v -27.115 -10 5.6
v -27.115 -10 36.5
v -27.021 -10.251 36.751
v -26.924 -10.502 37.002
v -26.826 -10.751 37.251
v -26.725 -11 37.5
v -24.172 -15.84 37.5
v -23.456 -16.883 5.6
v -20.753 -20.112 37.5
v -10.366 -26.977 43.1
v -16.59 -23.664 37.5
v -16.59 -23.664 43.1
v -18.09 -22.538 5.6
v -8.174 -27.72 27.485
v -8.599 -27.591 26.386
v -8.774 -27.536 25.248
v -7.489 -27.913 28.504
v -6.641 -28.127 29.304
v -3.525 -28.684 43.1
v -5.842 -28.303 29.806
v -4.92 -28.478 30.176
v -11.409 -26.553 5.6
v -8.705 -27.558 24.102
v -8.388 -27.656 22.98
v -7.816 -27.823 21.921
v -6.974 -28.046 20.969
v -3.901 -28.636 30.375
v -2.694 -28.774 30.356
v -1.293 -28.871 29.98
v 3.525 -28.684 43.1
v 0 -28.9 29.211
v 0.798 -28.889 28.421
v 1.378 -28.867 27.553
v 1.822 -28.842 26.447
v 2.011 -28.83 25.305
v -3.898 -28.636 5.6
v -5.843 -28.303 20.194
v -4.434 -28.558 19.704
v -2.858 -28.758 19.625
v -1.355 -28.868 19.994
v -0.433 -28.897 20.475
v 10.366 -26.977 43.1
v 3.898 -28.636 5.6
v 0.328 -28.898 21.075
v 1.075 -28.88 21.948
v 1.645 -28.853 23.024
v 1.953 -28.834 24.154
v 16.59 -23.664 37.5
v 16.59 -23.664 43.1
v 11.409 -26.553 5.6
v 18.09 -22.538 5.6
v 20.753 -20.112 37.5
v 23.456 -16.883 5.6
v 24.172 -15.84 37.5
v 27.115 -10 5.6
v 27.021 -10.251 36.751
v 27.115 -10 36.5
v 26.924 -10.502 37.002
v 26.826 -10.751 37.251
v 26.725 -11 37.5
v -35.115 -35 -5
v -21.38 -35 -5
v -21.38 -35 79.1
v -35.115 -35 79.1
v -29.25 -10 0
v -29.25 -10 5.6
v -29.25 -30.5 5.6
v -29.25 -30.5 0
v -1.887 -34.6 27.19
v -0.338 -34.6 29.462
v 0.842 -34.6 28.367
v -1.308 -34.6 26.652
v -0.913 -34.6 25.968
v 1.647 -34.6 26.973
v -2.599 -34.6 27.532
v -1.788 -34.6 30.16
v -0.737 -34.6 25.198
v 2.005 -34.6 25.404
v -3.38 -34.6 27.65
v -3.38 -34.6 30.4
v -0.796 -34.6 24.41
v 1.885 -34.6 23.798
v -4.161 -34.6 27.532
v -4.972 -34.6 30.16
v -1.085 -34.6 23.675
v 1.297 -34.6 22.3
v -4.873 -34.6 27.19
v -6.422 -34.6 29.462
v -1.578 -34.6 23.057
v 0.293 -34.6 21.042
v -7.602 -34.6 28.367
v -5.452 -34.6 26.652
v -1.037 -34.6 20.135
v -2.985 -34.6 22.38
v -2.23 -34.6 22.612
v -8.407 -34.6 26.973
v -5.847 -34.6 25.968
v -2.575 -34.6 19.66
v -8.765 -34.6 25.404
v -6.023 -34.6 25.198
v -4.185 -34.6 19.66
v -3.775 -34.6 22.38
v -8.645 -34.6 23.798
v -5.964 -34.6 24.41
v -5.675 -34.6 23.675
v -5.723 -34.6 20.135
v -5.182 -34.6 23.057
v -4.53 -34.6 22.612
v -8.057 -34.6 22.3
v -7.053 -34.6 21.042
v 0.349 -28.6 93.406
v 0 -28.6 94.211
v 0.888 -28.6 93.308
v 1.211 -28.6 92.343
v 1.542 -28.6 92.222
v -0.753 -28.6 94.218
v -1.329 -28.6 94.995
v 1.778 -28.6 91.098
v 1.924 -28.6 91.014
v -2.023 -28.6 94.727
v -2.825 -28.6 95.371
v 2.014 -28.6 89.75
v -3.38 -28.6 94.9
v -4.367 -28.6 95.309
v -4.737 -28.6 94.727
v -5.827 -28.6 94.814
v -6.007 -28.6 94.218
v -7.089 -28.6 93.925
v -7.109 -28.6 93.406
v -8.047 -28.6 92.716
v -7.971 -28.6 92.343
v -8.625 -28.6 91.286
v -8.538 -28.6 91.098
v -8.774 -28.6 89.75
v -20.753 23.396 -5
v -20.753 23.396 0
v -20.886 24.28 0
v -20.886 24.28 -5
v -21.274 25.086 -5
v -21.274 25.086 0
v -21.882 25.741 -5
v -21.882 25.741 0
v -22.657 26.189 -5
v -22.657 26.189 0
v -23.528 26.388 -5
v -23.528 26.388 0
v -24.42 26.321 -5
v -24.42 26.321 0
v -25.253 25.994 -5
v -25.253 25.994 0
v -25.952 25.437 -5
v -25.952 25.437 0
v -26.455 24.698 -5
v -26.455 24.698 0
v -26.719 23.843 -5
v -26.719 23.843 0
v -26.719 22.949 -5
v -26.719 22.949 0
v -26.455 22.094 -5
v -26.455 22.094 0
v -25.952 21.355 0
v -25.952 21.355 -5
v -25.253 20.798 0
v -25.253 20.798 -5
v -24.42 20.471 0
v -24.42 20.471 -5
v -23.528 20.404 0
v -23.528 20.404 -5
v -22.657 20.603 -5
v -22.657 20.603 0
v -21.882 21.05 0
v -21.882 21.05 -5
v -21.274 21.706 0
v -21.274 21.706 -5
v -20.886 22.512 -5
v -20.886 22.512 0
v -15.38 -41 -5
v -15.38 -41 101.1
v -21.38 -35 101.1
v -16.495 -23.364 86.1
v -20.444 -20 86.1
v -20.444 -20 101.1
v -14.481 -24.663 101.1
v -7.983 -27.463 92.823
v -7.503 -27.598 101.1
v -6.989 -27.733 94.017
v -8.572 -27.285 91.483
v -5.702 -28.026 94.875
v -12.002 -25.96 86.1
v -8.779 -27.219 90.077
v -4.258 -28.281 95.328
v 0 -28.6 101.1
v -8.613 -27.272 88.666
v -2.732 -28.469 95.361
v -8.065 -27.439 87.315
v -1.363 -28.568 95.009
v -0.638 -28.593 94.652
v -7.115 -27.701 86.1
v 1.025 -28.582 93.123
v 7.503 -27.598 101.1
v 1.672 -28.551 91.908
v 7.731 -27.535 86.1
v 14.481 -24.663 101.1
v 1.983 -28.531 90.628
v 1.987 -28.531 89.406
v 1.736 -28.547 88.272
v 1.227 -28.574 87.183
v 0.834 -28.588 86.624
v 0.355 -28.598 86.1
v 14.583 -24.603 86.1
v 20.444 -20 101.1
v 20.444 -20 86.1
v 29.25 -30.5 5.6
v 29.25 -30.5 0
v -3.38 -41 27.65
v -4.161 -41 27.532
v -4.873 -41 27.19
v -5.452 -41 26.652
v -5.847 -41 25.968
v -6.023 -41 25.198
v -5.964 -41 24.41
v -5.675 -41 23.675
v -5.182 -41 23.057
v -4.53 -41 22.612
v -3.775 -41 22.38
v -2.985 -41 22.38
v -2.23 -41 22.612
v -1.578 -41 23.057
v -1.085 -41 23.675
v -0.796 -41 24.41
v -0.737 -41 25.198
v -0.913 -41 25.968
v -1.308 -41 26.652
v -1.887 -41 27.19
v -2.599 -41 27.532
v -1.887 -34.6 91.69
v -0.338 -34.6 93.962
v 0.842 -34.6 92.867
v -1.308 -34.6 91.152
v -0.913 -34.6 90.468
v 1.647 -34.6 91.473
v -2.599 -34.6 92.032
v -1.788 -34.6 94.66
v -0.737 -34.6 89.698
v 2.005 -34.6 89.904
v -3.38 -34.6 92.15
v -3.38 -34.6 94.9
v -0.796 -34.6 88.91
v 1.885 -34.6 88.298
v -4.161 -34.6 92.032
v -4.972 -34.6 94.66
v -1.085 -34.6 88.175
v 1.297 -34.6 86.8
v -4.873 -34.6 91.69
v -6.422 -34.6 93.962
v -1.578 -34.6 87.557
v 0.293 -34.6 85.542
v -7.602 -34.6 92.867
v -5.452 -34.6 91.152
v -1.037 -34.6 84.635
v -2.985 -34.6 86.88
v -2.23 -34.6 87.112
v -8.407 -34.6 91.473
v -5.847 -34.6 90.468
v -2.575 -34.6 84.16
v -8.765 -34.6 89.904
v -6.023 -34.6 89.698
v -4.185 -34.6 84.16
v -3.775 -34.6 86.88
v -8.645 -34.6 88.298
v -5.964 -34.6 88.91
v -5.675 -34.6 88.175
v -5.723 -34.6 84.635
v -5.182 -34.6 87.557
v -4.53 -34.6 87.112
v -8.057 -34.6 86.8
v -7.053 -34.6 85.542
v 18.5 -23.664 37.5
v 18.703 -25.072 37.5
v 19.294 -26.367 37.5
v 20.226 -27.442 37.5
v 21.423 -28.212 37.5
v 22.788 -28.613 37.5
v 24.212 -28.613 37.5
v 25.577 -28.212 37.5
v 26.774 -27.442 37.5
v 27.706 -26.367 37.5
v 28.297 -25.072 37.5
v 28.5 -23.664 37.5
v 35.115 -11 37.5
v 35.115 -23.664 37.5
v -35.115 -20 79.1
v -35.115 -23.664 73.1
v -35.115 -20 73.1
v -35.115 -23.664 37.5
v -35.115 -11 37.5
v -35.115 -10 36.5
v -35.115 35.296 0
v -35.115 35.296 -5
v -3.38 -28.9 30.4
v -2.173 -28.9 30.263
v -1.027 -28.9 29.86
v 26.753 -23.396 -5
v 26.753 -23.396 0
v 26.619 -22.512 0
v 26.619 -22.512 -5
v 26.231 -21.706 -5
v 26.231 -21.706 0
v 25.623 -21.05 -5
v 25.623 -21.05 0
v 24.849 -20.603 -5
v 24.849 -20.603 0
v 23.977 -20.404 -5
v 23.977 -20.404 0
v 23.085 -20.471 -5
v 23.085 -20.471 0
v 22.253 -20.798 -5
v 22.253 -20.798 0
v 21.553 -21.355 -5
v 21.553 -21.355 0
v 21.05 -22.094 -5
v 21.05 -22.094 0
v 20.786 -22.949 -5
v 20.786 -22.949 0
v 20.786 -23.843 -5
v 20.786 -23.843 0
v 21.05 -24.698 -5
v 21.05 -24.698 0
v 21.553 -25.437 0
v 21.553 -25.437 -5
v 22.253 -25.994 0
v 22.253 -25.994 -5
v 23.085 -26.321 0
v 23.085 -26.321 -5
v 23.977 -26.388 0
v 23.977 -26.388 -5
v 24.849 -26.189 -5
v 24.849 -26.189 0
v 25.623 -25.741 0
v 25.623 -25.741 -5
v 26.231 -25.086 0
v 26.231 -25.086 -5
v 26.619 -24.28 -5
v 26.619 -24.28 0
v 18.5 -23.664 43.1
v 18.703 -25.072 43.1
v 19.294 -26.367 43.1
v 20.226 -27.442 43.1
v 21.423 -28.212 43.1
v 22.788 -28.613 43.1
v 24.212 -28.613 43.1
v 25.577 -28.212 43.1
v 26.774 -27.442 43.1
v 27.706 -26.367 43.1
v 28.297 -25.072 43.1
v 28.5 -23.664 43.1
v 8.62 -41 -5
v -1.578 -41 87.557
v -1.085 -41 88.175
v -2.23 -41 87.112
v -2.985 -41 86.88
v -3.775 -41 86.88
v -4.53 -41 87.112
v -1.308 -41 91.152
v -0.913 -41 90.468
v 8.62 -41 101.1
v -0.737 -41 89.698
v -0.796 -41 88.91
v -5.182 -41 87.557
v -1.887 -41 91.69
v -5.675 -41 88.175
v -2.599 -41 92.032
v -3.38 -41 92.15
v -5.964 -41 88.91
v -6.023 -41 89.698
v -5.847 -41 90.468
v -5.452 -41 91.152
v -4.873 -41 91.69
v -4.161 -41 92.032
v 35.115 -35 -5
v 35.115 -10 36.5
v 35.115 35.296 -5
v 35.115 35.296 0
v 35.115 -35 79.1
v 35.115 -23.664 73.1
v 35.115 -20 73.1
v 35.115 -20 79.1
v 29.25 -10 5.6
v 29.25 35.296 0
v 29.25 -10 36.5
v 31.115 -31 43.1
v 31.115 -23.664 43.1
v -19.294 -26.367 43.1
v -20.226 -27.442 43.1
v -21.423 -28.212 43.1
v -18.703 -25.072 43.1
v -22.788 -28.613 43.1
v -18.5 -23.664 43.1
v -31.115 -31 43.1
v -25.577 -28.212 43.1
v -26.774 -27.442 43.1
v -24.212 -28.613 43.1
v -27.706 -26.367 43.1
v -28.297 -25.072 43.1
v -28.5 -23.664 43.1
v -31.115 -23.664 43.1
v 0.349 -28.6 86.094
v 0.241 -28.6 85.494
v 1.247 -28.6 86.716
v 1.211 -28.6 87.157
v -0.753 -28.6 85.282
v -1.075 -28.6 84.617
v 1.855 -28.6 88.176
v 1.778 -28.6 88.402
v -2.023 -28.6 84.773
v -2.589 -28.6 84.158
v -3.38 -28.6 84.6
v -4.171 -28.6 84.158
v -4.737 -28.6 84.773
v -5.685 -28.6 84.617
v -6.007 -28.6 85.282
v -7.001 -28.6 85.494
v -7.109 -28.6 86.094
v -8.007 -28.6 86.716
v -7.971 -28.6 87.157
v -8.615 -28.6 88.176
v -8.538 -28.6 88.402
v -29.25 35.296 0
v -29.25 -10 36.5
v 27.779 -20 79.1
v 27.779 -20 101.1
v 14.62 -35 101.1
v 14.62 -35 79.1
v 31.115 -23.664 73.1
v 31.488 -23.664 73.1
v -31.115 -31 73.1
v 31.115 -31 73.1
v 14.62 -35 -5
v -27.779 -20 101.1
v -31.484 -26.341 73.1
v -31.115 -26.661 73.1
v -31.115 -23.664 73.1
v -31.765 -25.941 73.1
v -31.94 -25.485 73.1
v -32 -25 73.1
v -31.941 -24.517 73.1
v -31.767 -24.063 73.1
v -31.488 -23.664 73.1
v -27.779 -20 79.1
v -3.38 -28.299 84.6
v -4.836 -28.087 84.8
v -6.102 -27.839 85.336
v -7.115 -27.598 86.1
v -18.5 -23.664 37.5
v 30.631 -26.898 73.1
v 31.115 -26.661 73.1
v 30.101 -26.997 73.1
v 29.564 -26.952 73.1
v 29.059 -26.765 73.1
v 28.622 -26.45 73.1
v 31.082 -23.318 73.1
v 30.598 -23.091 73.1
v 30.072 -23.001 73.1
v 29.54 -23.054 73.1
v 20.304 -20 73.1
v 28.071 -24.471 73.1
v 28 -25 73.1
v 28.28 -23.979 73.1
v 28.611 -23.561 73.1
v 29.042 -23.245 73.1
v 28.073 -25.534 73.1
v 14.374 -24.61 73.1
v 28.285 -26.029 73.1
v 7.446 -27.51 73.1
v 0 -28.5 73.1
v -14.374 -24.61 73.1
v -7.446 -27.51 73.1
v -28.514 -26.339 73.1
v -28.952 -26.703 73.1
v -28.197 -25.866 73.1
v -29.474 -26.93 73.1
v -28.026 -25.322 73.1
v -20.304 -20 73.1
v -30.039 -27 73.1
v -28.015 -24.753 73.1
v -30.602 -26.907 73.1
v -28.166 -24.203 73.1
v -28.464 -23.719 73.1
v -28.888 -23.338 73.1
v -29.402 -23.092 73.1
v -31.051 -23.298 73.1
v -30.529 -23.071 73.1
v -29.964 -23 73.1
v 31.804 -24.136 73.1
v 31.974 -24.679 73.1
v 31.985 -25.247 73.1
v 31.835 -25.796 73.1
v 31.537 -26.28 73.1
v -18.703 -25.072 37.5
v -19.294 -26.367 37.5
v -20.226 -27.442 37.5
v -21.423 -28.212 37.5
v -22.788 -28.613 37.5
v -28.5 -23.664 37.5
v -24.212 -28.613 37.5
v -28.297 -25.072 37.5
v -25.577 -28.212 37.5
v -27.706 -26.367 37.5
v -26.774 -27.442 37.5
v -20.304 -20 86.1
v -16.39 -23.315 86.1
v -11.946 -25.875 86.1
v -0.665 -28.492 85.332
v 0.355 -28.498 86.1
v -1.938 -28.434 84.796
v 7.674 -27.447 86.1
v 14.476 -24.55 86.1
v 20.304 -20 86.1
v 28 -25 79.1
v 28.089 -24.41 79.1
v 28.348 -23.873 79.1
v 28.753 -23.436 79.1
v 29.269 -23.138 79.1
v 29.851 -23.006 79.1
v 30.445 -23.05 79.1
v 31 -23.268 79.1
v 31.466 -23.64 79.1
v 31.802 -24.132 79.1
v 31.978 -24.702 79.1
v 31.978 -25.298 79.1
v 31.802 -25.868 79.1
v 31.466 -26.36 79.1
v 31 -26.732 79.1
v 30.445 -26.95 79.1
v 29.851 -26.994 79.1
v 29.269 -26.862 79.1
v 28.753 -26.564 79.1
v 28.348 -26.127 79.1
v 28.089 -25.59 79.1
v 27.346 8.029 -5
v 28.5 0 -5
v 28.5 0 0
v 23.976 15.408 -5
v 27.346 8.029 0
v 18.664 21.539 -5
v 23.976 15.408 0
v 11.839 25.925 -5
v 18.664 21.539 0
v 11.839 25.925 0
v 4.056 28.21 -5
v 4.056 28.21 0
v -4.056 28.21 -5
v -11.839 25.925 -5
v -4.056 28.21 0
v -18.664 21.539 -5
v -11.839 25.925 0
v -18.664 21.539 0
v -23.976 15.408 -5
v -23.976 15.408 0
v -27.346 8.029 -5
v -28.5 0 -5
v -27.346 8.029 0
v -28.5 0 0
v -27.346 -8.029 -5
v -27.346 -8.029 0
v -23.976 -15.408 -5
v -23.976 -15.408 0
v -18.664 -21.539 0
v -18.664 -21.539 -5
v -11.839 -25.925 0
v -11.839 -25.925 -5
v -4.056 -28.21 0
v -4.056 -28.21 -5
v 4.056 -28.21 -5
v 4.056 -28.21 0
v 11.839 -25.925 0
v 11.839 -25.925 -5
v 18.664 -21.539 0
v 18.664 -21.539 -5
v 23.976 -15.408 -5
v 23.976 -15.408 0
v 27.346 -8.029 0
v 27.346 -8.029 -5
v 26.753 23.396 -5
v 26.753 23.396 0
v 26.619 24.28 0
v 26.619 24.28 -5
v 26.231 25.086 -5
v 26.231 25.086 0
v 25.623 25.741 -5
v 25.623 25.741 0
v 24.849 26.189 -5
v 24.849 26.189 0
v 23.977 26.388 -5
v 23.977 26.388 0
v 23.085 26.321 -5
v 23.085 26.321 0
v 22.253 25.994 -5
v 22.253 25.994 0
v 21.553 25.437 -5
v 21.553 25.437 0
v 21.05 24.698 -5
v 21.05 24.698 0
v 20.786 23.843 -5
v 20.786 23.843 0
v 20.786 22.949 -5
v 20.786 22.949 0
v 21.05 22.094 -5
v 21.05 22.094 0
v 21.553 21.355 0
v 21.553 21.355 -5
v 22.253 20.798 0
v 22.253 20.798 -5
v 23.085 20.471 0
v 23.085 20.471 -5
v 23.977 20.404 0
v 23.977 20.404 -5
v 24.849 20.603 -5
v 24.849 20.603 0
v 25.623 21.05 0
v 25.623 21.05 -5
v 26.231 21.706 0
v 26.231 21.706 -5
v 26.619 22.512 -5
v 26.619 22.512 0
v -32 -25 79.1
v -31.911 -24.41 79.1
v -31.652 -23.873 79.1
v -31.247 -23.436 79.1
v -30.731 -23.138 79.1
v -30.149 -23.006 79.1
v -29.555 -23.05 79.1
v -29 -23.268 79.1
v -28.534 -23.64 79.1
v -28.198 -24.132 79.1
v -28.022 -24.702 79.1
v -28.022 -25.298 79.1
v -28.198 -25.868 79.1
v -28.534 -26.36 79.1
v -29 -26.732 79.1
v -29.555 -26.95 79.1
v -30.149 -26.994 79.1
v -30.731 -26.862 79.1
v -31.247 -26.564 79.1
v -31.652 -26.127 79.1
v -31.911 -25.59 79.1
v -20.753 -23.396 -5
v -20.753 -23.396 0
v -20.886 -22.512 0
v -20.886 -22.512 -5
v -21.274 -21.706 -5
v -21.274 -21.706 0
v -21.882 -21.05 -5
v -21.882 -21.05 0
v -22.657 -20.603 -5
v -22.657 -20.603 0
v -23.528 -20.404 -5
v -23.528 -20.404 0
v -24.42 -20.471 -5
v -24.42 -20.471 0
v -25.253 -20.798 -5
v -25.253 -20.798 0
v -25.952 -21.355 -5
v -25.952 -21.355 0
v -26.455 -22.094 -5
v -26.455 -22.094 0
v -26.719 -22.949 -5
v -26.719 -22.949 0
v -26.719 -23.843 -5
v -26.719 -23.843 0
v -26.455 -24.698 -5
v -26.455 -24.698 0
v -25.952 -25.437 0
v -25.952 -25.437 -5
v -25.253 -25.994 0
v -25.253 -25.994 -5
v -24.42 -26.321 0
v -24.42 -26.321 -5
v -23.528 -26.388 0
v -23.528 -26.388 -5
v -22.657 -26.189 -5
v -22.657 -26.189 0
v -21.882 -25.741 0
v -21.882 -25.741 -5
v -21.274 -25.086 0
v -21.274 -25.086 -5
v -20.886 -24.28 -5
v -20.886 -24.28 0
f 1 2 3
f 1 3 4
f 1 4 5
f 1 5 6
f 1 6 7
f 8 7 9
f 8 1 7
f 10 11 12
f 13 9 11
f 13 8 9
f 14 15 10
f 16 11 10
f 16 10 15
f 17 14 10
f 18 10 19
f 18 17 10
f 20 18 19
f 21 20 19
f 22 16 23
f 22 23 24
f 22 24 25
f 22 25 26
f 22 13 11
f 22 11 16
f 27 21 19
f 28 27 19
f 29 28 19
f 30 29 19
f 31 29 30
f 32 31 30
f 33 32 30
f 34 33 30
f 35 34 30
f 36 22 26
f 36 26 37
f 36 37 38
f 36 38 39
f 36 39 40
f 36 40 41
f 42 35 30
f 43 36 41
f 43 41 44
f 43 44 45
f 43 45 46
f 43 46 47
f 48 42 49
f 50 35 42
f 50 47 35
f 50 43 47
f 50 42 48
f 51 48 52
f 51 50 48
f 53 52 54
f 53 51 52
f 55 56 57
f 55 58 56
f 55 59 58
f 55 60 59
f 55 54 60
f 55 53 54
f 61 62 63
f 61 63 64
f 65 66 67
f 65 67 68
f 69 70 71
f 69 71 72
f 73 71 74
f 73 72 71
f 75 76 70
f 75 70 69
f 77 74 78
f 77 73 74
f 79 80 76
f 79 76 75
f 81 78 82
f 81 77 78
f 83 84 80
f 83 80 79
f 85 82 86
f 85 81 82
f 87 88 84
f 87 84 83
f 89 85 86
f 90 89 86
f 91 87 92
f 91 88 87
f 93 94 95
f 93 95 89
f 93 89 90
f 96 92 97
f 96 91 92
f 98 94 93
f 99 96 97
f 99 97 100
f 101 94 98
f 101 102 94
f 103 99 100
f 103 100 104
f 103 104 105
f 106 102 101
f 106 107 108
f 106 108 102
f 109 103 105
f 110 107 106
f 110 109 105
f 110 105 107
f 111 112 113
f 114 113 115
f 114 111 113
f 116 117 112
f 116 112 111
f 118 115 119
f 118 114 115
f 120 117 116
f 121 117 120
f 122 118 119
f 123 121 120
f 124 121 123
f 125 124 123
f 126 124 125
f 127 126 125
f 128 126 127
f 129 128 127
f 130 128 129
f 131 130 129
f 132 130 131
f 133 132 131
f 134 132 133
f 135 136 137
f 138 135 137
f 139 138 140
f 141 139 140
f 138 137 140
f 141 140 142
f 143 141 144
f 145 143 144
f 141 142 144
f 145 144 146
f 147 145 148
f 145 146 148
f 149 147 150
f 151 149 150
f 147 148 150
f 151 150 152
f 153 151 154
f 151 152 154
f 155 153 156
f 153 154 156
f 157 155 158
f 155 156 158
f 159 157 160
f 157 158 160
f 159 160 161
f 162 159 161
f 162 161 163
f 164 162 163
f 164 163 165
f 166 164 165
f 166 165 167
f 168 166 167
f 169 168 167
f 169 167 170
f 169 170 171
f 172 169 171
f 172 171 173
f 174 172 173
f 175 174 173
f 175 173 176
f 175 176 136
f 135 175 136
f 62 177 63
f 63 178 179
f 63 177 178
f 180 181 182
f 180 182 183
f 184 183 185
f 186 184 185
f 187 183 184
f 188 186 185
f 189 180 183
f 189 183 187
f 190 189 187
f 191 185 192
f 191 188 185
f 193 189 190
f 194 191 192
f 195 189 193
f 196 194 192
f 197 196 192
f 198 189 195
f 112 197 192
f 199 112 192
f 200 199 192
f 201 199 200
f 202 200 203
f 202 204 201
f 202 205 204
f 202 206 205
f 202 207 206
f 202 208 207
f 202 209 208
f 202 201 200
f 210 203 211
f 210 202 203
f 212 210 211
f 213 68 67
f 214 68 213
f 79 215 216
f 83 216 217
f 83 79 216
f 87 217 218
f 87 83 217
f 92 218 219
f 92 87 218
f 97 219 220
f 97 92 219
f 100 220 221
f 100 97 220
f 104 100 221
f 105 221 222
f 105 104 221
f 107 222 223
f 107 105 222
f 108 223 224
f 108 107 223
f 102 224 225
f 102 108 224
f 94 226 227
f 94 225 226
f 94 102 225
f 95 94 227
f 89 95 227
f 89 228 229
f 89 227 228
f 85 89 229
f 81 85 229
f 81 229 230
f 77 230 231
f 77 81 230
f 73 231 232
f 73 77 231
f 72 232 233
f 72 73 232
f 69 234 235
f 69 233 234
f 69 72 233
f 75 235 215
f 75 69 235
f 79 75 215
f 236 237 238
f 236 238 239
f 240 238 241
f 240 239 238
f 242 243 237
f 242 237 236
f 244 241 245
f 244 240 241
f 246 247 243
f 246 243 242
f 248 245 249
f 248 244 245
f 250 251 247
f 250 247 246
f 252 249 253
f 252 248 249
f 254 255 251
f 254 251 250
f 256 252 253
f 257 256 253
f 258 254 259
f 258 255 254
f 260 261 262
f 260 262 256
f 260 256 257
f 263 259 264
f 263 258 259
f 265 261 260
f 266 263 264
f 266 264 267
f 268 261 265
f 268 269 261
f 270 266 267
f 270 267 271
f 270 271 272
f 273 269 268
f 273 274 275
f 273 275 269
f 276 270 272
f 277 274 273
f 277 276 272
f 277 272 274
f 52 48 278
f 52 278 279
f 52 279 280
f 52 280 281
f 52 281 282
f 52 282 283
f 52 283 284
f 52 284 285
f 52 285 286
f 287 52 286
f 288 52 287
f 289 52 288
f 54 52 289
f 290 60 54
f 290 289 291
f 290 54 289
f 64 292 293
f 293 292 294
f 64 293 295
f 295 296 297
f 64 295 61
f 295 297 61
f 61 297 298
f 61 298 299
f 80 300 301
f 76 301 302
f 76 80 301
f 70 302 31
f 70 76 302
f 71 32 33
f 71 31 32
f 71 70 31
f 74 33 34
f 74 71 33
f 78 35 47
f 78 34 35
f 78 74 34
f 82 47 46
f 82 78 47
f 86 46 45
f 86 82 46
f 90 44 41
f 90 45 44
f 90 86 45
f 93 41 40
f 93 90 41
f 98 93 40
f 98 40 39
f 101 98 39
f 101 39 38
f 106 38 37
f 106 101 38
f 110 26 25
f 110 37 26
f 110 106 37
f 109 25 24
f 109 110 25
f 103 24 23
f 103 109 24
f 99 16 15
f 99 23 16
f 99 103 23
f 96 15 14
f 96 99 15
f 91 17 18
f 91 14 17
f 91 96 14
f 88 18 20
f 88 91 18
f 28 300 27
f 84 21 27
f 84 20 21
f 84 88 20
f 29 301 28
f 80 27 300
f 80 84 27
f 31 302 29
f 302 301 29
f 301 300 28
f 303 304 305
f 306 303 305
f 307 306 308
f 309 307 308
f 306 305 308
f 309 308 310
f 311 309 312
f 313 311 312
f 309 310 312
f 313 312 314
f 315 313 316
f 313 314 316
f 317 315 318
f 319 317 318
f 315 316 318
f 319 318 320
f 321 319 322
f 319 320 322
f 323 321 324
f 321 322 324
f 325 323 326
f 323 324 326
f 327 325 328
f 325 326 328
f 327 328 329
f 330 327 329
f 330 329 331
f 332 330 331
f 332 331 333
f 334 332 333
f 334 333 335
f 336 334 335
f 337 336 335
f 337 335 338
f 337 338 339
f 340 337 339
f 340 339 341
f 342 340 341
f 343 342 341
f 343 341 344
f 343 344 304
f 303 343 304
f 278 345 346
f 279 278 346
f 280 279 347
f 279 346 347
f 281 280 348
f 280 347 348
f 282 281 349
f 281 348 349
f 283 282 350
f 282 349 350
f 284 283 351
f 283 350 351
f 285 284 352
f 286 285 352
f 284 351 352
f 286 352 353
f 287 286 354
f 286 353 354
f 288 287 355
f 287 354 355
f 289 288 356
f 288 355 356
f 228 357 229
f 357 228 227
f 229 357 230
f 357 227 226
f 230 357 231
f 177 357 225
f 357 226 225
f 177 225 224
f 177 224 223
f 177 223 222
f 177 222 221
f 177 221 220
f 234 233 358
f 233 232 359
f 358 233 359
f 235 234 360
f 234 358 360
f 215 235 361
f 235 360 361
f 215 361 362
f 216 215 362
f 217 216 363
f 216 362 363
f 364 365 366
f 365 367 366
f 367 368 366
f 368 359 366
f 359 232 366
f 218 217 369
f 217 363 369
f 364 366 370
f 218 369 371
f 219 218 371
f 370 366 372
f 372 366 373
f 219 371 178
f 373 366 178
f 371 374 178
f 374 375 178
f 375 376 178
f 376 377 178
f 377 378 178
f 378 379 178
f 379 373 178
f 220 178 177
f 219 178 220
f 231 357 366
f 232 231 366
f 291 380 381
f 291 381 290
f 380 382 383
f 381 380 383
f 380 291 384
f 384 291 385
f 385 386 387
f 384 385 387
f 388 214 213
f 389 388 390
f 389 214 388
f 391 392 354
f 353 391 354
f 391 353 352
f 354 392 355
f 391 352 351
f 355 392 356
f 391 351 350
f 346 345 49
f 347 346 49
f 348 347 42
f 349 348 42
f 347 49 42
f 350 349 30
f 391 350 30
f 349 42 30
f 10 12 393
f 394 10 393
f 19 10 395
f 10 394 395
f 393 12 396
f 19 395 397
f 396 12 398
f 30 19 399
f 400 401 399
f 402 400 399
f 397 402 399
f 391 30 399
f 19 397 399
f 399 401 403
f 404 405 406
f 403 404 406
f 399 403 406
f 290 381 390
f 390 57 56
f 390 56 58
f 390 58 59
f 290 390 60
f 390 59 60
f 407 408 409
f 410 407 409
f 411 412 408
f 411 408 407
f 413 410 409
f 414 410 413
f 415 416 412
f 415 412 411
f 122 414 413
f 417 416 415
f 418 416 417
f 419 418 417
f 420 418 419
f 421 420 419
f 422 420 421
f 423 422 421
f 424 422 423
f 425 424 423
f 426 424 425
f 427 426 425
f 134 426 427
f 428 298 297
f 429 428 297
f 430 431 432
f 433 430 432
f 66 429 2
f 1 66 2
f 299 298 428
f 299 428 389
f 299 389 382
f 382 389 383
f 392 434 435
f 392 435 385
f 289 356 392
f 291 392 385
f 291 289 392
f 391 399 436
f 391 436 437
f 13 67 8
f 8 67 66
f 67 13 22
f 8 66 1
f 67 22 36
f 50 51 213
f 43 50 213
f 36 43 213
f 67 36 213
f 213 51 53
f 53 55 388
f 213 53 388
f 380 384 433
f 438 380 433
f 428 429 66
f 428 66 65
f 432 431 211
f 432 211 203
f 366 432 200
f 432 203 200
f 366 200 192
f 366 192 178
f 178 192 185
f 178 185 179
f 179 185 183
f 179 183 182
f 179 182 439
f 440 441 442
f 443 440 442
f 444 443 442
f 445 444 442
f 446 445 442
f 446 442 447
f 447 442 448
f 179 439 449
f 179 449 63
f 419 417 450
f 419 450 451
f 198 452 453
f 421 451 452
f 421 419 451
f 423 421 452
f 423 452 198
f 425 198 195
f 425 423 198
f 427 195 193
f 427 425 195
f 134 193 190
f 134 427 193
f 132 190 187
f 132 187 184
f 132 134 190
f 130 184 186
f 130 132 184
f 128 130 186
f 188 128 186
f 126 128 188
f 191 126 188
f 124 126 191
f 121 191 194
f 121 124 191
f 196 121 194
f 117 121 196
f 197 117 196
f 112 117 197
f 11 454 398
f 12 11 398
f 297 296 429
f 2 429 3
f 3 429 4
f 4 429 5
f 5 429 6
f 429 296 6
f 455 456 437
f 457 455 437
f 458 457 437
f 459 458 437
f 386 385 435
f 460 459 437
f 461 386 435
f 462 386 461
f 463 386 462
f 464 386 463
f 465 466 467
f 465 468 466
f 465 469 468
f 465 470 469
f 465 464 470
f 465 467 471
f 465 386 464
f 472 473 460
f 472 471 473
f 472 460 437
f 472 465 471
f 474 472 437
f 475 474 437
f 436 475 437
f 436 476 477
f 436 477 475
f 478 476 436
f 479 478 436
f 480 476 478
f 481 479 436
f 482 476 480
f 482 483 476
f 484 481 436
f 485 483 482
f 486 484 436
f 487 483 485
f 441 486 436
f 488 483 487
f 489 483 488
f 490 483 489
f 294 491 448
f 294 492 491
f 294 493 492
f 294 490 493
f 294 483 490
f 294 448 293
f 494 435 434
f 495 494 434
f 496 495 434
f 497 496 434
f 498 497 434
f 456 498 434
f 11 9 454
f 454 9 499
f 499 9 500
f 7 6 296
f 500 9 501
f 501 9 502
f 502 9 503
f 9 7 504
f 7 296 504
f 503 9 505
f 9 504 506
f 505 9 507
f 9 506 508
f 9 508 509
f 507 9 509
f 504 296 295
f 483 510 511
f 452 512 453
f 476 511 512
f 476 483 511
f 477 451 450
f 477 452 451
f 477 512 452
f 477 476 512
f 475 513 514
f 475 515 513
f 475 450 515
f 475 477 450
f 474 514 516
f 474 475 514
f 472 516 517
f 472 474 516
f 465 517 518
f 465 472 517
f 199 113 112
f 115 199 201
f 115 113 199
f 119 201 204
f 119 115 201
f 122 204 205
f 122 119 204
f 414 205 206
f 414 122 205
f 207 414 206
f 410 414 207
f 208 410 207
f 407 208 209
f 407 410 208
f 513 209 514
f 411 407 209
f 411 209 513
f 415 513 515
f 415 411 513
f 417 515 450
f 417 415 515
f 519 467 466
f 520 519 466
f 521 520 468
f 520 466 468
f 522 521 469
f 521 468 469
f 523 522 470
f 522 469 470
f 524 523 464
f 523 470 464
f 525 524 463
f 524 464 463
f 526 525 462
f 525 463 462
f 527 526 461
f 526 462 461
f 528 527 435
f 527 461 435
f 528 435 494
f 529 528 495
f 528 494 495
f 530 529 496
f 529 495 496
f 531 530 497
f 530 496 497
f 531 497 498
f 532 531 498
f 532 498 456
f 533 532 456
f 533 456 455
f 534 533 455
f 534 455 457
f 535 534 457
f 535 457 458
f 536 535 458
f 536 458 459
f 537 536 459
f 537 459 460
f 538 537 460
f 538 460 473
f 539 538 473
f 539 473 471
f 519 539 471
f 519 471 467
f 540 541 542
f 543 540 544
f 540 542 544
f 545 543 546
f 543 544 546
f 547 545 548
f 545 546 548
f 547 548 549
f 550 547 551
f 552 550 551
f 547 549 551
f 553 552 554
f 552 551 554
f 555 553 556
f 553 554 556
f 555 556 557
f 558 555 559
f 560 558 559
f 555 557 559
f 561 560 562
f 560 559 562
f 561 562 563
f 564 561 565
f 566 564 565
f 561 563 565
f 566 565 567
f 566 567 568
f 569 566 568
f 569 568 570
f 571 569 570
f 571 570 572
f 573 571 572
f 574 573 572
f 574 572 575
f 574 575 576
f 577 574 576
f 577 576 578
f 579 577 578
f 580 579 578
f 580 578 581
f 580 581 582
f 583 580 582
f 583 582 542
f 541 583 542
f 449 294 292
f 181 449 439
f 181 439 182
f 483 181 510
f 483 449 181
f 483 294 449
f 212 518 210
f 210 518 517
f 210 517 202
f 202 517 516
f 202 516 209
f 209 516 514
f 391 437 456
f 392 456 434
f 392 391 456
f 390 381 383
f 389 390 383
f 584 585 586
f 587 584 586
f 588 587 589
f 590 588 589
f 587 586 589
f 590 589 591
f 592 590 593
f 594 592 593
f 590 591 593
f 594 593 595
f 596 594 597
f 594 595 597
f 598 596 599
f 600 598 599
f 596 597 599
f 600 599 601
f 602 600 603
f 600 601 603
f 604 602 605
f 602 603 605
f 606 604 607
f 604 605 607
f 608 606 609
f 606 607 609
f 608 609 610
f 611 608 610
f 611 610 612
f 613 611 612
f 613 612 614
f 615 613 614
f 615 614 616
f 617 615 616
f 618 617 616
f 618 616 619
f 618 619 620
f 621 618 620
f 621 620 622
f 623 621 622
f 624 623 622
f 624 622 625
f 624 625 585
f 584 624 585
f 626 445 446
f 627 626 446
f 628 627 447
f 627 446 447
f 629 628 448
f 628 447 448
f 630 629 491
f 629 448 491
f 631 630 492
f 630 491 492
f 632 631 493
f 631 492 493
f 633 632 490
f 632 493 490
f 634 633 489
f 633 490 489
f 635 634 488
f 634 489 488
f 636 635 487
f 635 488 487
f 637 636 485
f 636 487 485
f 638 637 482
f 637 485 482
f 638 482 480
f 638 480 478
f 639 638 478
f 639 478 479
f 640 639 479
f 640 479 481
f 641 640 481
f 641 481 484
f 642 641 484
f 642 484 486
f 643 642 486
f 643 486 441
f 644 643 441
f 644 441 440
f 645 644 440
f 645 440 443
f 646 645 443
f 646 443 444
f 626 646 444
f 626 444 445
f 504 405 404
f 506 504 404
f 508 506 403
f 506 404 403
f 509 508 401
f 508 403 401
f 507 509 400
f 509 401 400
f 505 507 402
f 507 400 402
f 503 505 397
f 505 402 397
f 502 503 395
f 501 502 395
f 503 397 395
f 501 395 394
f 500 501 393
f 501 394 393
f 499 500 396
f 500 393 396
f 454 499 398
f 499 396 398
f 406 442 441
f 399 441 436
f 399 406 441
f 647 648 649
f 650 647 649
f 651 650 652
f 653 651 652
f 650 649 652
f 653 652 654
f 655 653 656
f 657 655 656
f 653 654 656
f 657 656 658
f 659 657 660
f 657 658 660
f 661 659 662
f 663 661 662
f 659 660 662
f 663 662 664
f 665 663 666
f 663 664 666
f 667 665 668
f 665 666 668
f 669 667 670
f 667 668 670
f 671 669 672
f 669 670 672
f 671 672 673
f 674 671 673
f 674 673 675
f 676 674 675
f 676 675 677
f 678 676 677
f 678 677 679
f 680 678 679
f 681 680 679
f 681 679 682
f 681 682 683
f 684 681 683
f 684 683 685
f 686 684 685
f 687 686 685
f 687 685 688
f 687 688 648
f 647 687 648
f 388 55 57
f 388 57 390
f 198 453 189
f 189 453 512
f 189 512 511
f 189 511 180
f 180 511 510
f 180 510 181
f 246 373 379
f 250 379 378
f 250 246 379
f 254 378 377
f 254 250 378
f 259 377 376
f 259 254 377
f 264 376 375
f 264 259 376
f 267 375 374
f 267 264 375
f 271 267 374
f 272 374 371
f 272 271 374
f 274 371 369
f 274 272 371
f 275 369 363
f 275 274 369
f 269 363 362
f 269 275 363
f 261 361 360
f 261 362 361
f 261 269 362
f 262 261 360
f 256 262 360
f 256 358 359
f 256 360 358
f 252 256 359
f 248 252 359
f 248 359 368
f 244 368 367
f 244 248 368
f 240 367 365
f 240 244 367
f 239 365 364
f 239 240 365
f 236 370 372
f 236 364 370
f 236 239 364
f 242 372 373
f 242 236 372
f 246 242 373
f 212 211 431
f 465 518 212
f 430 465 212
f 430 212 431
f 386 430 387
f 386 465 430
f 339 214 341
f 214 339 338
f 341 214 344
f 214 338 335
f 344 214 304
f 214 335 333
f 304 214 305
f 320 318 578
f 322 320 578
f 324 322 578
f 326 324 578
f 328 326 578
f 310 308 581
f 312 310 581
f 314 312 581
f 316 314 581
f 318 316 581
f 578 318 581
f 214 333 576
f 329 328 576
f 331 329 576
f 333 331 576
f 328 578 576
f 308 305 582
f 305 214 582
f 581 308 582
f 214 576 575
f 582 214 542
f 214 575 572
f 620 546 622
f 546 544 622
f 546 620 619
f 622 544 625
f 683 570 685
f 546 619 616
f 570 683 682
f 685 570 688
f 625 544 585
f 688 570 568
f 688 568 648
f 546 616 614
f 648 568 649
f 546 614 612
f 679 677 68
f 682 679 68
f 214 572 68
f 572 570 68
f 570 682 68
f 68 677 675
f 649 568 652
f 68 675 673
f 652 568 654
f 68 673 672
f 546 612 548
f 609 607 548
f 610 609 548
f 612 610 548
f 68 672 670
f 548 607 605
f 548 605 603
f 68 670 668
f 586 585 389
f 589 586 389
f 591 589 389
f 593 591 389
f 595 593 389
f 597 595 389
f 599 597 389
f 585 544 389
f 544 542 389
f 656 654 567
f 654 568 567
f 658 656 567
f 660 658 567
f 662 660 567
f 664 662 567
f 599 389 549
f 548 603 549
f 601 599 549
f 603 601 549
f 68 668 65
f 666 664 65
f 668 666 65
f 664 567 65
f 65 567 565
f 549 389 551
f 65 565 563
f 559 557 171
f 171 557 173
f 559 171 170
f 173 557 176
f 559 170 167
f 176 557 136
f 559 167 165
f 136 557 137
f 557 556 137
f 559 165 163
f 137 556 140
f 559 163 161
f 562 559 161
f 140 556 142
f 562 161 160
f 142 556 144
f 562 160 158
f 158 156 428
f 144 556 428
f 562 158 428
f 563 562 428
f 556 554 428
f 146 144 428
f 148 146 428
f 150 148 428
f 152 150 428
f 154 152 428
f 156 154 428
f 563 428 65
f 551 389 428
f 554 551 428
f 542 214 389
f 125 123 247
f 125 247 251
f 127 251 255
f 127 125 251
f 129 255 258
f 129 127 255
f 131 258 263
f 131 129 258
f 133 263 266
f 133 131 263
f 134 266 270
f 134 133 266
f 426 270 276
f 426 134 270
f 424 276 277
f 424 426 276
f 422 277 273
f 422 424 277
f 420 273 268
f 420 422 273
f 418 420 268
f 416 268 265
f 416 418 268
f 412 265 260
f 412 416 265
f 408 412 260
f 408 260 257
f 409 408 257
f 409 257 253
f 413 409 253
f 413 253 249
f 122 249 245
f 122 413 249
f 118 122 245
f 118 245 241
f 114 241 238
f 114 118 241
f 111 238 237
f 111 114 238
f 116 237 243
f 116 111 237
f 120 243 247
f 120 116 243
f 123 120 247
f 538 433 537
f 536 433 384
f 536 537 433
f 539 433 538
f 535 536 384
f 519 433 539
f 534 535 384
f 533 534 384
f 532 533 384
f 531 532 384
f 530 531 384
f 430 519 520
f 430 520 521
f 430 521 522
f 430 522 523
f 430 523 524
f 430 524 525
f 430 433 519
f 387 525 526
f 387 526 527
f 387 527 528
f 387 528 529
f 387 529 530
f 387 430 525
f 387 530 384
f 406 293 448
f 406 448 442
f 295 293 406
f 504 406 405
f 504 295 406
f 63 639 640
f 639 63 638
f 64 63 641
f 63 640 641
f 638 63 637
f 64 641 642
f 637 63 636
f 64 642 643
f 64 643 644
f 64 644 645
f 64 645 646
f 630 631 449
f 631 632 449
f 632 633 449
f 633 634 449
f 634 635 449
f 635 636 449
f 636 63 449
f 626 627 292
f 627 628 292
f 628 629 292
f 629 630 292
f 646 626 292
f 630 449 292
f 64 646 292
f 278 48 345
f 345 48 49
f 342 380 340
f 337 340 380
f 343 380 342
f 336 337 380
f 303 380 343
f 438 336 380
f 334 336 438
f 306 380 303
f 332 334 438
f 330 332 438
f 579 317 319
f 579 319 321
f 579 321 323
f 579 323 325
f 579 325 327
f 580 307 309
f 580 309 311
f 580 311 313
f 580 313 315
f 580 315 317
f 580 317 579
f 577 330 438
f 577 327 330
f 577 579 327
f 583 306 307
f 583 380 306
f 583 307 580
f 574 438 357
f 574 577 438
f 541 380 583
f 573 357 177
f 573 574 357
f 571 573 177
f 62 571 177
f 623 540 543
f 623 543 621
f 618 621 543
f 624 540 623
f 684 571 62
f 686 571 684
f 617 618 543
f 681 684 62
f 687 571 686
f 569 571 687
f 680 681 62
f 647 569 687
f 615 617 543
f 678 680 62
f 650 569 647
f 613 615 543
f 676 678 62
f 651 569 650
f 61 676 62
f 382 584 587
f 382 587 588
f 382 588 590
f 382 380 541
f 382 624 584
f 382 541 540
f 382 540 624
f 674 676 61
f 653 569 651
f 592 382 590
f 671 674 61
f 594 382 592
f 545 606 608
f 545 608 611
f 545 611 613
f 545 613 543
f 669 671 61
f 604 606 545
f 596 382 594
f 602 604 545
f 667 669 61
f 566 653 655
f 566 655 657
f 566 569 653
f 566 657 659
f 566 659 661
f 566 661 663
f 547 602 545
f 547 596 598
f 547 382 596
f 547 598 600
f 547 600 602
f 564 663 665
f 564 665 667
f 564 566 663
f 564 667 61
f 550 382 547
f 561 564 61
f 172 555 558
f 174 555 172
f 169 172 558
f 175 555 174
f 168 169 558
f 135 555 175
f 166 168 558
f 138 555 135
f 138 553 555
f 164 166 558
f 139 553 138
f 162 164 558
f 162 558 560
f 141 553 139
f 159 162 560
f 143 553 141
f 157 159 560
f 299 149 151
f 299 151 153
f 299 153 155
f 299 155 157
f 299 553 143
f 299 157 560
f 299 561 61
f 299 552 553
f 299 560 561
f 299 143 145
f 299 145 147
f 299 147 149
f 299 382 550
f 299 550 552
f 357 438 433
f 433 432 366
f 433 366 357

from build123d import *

# Parameters (mm, degrees)
AUFSATZ_LINEAR_AUSTRAGEN1_DEPTH                = 43.1
SKIZZE2_R                                      = 2.55
AUFSATZ_LINEAR_AUSTRAGEN2_DEPTH                = 5
AUFSATZ_LINEAR_AUSTRAGEN2_TAPER                = 10
SCHNITT_LINEAR_AUSTRAGEN1_DEPTH                = 5.6
FASE1_SIZE                                     = 1
SCHNITT_LINEAR_AUSTRAGEN2_DEPTH                = 64.61475613
SCHNITT_LINEAR_AUSTRAGEN2_DEPTH_BACK           = 7.61475613
AUFSATZ_LINEAR_AUSTRAGEN3_DEPTH                = 30
AUFSATZ_LINEAR_AUSTRAGEN4_DEPTH                = 13
AUFSATZ_LINEAR_AUSTRAGEN5_DEPTH                = 15
AUFSATZ_LINEAR_AUSTRAGEN6_DEPTH                = 101.1
F_1_0_1_DURCHMESSER_BOHRUNG1_D                 = 1
F_1_0_1_DURCHMESSER_BOHRUNG1_DEPTH             = 25
F_1_0_1_DURCHMESSER_BOHRUNG1_TIP               = 0.30043031
F_1_0_1_DURCHMESSER_BOHRUNG2_D                 = 1
F_1_0_1_DURCHMESSER_BOHRUNG2_DEPTH             = 25
F_1_0_1_DURCHMESSER_BOHRUNG2_TIP               = 0.30043031
AUFSATZ_LINEAR_AUSTRAGEN7_DEPTH                = 5
SKIZZE48_R                                     = 28.5
SCHNITT_LINEAR_AUSTRAGEN4_DEPTH                = 6
SKIZZE49_W                                     = 58.5
SKIZZE49_H                                     = 5.6
SCHNITT_LINEAR_AUSTRAGEN8_DEPTH                = 20.5
F_6_0_6_DURCHMESSER_BOHRUNG1_D                 = 6
F_6_0_6_DURCHMESSER_BOHRUNG1_DEPTH             = 5
AUFSATZ_LINEAR_AUSTRAGEN8_DEPTH                = 5.864512
AUFSATZ_LINEAR_AUSTRAGEN9_DEPTH                = 5.865
SCHNITT_LINEAR_AUSTRAGEN11_DEPTH               = 22
F_4_0_4_DURCHMESSER_BOHRUNG2_D                 = 4
F_4_0_4_DURCHMESSER_BOHRUNG2_DEPTH             = 6
STIRNSENKUNG_F_R_M5_ZYLINDERSCHRAUBE_3_A_COUNT = 2
STIRNSENKUNG_F_R_M5_ZYLINDERSCHRAUBE_3_A_PITCH = 64.5


with BuildPart() as part:
    # Skizze1 → Aufsatz-Linear austragen1 (new body)
    with BuildSketch(Plane.XY):
        with BuildLine():
            Line((27.11475613, -10), (35.11475613, -10))
            Line((35.11475613, -10), (35.11475613, -35))
            Line((35.11475613, -35), (-35.11475613, -35))
            Line((-35.11475613, -35), (-35.11475613, -10))
            Line((-35.11475613, -10), (-27.11475613, -10))
            ThreePointArc((-27.11475613, -10), (0, -28.9), (27.11475613, -10))
        make_face()
    extrude(amount=AUFSATZ_LINEAR_AUSTRAGEN1_DEPTH)

    # Skizze2 → Aufsatz-Linear austragen2 (add)
    with BuildSketch(Plane(origin=(0, 0, 0), x_dir=(-1, 0, 0), z_dir=(0, 0, -1))):
        with Locations((-23.5, -23.663738082)):
            Circle(SKIZZE2_R)
        with Locations((23.5, -23.663738082)):
            Circle(SKIZZE2_R)
    extrude(amount=AUFSATZ_LINEAR_AUSTRAGEN2_DEPTH, taper=AUFSATZ_LINEAR_AUSTRAGEN2_TAPER)

    # Skizze3 → Schnitt-Linear austragen1 (cut)
    with BuildSketch(Plane.XY.offset(43.1)):
        with BuildLine():
            Line((28.5, -23.663738082), (28.5, -7.705302488))
            Line((28.5, -7.705302488), (-28.5, -7.705302488))
            Line((-28.5, -7.705302488), (-28.5, -23.663738082))
            ThreePointArc((-28.5, -23.663738082), (-23.5, -28.663738082), (-18.5, -23.663738082))
            Line((-18.5, -23.663738082), (-18.5, -22.202702538))
            Line((-18.5, -22.202702538), (18.5, -22.202702538))
            Line((18.5, -22.202702538), (18.5, -23.663738082))
            ThreePointArc((18.5, -23.663738082), (23.5, -28.663738082), (28.5, -23.663738082))
        make_face()
    extrude(amount=-SCHNITT_LINEAR_AUSTRAGEN1_DEPTH, mode=Mode.SUBTRACT)

    # Fase1
    fase1_edges = [part.edges().sort_by_distance(p)[0] for p in [
        (27.807378065, -10, 37.5),
        (-27.807378065, -10, 37.5),
    ]]
    chamfer(fase1_edges, length=FASE1_SIZE)

    # Skizze4 → Schnitt-Linear austragen2 (cut, two sides)
    with BuildSketch(Plane(origin=(-28.5, 0, 0), x_dir=(0, 0, -1), z_dir=(1, 0, 0))) as schnitt_linear_austragen2_sk:
        Polygon((-36.5, -10), (-37.5, -11), (-37.5, -23.663738082), (-43.1, -23.663738082), (-43.1, -10), align=None)
    extrude(amount=SCHNITT_LINEAR_AUSTRAGEN2_DEPTH, mode=Mode.SUBTRACT)
    extrude(schnitt_linear_austragen2_sk.sketch, amount=-SCHNITT_LINEAR_AUSTRAGEN2_DEPTH_BACK, mode=Mode.SUBTRACT)

    # Skizze5 → Aufsatz-Linear austragen3 (add)
    with BuildSketch(Plane.XY.offset(43.1)):
        Polygon((-35.11475613, -35), (-35.11475613, -23.663738082), (-31.11475613, -23.663738082), (-31.11475613, -31), (31.11475613, -31), (31.11475613, -23.663738082), (35.11475613, -23.663738082), (35.11475613, -35), align=None)
    extrude(amount=AUFSATZ_LINEAR_AUSTRAGEN3_DEPTH)

    # Skizze6 → Aufsatz-Linear austragen4 (add)
    with BuildSketch(Plane.XY.offset(73.1)):
        with BuildLine():
            Line((35.11475613, -35), (-35.11475613, -35))
            Line((-35.11475613, -35), (-35.11475613, -20))
            Line((-35.11475613, -20), (-20.303940504, -20))
            ThreePointArc((-20.303940504, -20), (0, -28.5), (20.303940504, -20))
            Line((20.303940504, -20), (35.11475613, -20))
            Line((35.11475613, -20), (35.11475613, -35))
        make_face()
    extrude(amount=AUFSATZ_LINEAR_AUSTRAGEN4_DEPTH)

    # Skizze7 → Aufsatz-Linear austragen5 (add)
    with BuildSketch(Plane.XY.offset(86.1)):
        with BuildLine():
            Line((35.11475613, -35), (-35.11475613, -35))
            Line((-35.11475613, -35), (-35.11475613, -20))
            Line((-35.11475613, -20), (-20.444070045, -20))
            ThreePointArc((-20.444070045, -20), (0, -28.6), (20.444070045, -20))
            Line((20.444070045, -20), (35.11475613, -20))
            Line((35.11475613, -20), (35.11475613, -35))
        make_face()
    extrude(amount=AUFSATZ_LINEAR_AUSTRAGEN5_DEPTH)

    # Skizze24 → Aufsatz-Linear austragen6 (add)
    with BuildSketch(Plane(origin=(0, 0, 0), x_dir=(-1, 0, 0), z_dir=(0, 0, -1))):
        Polygon((-8.62, -41), (-14.62, -35), (21.38, -35), (15.38, -41), align=None)
    extrude(amount=-AUFSATZ_LINEAR_AUSTRAGEN6_DEPTH)

    # Ø1.0 (1) Durchmesser Bohrung1
    with Locations(Plane(origin=(0, -41, 0), x_dir=(-1, 0, 0), z_dir=(0, -1, 0))):
        with Locations((3.38, -25)):
            Hole(F_1_0_1_DURCHMESSER_BOHRUNG1_D / 2, depth=F_1_0_1_DURCHMESSER_BOHRUNG1_DEPTH)
            with Locations((0, 0, -(F_1_0_1_DURCHMESSER_BOHRUNG1_DEPTH + F_1_0_1_DURCHMESSER_BOHRUNG1_TIP / 2))):  # 118° drill point
                Cone(0, F_1_0_1_DURCHMESSER_BOHRUNG1_D / 2, F_1_0_1_DURCHMESSER_BOHRUNG1_TIP, mode=Mode.SUBTRACT)

    # Skizze32 → Stirnsenkung f_r M5 Zylinderschraube mit (revolve, cut)
    with BuildSketch(Plane(origin=(-3.38, -28.9, 25), x_dir=(0, 0, -1), z_dir=(1, 0, 0))):
        Polygon((0, 0), (0, 26.652366702), (2.75, 25), (2.75, 7), (5.4, 7), (5.4, 0), align=None)
    revolve(axis=Axis((-3.38, -35.25, 25), (0, 1, 0)), mode=Mode.SUBTRACT)

    # Ø1.0 (1) Durchmesser Bohrung2
    with Locations(Plane(origin=(0, -41, 0), x_dir=(-1, 0, 0), z_dir=(0, -1, 0))):
        with Locations((3.38, -90)):
            Hole(F_1_0_1_DURCHMESSER_BOHRUNG2_D / 2, depth=F_1_0_1_DURCHMESSER_BOHRUNG2_DEPTH)
            with Locations((0, 0, -(F_1_0_1_DURCHMESSER_BOHRUNG2_DEPTH + F_1_0_1_DURCHMESSER_BOHRUNG2_TIP / 2))):  # 118° drill point
                Cone(0, F_1_0_1_DURCHMESSER_BOHRUNG2_D / 2, F_1_0_1_DURCHMESSER_BOHRUNG2_TIP, mode=Mode.SUBTRACT)

    # Skizze41 → Stirnsenkung f_r M5 Zylinderschraube 2 (revolve, cut)
    with BuildSketch(Plane(origin=(-3.38, -28.6, 90), x_dir=(0, 0, -1), z_dir=(1, 0, 0))):
        Polygon((0, 0), (0, 26.652366702), (2.75, 25), (2.75, 7), (5.4, 7), (5.4, 0), align=None)
    revolve(axis=Axis((-3.38, -34.95, 90), (0, 1, 0)), mode=Mode.SUBTRACT)

    # Skizze45 → Aufsatz-Linear austragen7 (add)
    with BuildSketch(Plane(origin=(0, 0, 0), x_dir=(-1, 0, 0), z_dir=(0, 0, -1))):
        Polygon((-35.11475613, -35), (-14.62, -35), (-8.62, -41), (15.38, -41), (21.38, -35), (35.11475613, -35), (35.11475613, 35.295549341), (-35.11475613, 35.295549341), align=None)
    extrude(amount=AUFSATZ_LINEAR_AUSTRAGEN7_DEPTH)

    # Skizze48 → Schnitt-Linear austragen4 (cut, through all)
    with BuildSketch(Plane.XY):
        Circle(SKIZZE48_R)
    extrude(amount=-SCHNITT_LINEAR_AUSTRAGEN4_DEPTH, mode=Mode.SUBTRACT)

    # Skizze49 → Schnitt-Linear austragen8 (cut)
    with BuildSketch(Plane(origin=(0, -10, 0), x_dir=(1, 0, 0), z_dir=(0, 1, 0))):
        with Locations((-0.00024387, -2.8)):
            Rectangle(SKIZZE49_W, SKIZZE49_H)
    extrude(amount=-SCHNITT_LINEAR_AUSTRAGEN8_DEPTH, mode=Mode.SUBTRACT)

    # Ø6.0 (6) Durchmesser Bohrung1
    with Locations(Plane(origin=(0, 0, -5), x_dir=(-1, 0, 0), z_dir=(0, 0, -1))):
        with Locations((-23.752539123, 23.39599293), (23.752539123, 23.39599293), (23.752539123, -23.39599293), (-23.752539123, -23.39599293)):
            Hole(F_6_0_6_DURCHMESSER_BOHRUNG1_D / 2, depth=F_6_0_6_DURCHMESSER_BOHRUNG1_DEPTH)

    # Skizze54 → Aufsatz-Linear austragen8 (add)
    with BuildSketch(Plane.ZY.offset(35.11475613)):
        Polygon((0, 35.295549341), (36.5, -10), (0, -10), align=None)
    extrude(amount=-AUFSATZ_LINEAR_AUSTRAGEN8_DEPTH)

    # Skizze55 → Aufsatz-Linear austragen9 (add)
    with BuildSketch(Plane(origin=(35.11475613, 0, 0), x_dir=(0, 0, -1), z_dir=(1, 0, 0))):
        Polygon((0, 35.295549341), (0, -10), (-36.5, -10), align=None)
    extrude(amount=-AUFSATZ_LINEAR_AUSTRAGEN9_DEPTH)

    # Skizze62 → Schnitt-Linear austragen11 (cut)
    with BuildSketch(Plane.XY.offset(101.1)):
        Polygon((-35.11475613, -20), (-27.779413088, -20), (-21.38, -35), (-35.11475613, -35), align=None)
        Polygon((35.11475613, -20), (27.779413088, -20), (14.62, -35), (35.11475613, -35), align=None)
    extrude(amount=-SCHNITT_LINEAR_AUSTRAGEN11_DEPTH, mode=Mode.SUBTRACT)

    # Ø4.0 (4) Durchmesser Bohrung2
    with Locations(Plane.XY.offset(79.1)):
        with Locations((-30, -25), (30, -25)):
            Hole(F_4_0_4_DURCHMESSER_BOHRUNG2_D / 2, depth=F_4_0_4_DURCHMESSER_BOHRUNG2_DEPTH)

    # Skizze68 → Stirnsenkung f_r M5 Zylinderschraube 3 (revolve, cut)
    with BuildSketch(Plane(origin=(-3.38, -28.6, 25), x_dir=(0, 0, 1), z_dir=(1, 0, 0))):
        Polygon((0, 0), (0, 26.59228064), (2.65, 25), (2.65, 6), (5.4, 6), (5.4, 0), align=None)
    stirnsenkung_f_r_m5_zylinderschraube_3 = revolve(axis=Axis((-3.38, -22.25, 25), (0, -1, 0)), mode=Mode.SUBTRACT)

    # Stirnsenkung f_r M5 Zylinderschraube 3 a: Stirnsenkung f_r M5 Zylinderschraube 3 ×2
    with Locations(*[(0, 0, i * STIRNSENKUNG_F_R_M5_ZYLINDERSCHRAUBE_3_A_PITCH) for i in range(1, STIRNSENKUNG_F_R_M5_ZYLINDERSCHRAUBE_3_A_COUNT)]):
        add(stirnsenkung_f_r_m5_zylinderschraube_3, mode=Mode.SUBTRACT)


solid = part.part
